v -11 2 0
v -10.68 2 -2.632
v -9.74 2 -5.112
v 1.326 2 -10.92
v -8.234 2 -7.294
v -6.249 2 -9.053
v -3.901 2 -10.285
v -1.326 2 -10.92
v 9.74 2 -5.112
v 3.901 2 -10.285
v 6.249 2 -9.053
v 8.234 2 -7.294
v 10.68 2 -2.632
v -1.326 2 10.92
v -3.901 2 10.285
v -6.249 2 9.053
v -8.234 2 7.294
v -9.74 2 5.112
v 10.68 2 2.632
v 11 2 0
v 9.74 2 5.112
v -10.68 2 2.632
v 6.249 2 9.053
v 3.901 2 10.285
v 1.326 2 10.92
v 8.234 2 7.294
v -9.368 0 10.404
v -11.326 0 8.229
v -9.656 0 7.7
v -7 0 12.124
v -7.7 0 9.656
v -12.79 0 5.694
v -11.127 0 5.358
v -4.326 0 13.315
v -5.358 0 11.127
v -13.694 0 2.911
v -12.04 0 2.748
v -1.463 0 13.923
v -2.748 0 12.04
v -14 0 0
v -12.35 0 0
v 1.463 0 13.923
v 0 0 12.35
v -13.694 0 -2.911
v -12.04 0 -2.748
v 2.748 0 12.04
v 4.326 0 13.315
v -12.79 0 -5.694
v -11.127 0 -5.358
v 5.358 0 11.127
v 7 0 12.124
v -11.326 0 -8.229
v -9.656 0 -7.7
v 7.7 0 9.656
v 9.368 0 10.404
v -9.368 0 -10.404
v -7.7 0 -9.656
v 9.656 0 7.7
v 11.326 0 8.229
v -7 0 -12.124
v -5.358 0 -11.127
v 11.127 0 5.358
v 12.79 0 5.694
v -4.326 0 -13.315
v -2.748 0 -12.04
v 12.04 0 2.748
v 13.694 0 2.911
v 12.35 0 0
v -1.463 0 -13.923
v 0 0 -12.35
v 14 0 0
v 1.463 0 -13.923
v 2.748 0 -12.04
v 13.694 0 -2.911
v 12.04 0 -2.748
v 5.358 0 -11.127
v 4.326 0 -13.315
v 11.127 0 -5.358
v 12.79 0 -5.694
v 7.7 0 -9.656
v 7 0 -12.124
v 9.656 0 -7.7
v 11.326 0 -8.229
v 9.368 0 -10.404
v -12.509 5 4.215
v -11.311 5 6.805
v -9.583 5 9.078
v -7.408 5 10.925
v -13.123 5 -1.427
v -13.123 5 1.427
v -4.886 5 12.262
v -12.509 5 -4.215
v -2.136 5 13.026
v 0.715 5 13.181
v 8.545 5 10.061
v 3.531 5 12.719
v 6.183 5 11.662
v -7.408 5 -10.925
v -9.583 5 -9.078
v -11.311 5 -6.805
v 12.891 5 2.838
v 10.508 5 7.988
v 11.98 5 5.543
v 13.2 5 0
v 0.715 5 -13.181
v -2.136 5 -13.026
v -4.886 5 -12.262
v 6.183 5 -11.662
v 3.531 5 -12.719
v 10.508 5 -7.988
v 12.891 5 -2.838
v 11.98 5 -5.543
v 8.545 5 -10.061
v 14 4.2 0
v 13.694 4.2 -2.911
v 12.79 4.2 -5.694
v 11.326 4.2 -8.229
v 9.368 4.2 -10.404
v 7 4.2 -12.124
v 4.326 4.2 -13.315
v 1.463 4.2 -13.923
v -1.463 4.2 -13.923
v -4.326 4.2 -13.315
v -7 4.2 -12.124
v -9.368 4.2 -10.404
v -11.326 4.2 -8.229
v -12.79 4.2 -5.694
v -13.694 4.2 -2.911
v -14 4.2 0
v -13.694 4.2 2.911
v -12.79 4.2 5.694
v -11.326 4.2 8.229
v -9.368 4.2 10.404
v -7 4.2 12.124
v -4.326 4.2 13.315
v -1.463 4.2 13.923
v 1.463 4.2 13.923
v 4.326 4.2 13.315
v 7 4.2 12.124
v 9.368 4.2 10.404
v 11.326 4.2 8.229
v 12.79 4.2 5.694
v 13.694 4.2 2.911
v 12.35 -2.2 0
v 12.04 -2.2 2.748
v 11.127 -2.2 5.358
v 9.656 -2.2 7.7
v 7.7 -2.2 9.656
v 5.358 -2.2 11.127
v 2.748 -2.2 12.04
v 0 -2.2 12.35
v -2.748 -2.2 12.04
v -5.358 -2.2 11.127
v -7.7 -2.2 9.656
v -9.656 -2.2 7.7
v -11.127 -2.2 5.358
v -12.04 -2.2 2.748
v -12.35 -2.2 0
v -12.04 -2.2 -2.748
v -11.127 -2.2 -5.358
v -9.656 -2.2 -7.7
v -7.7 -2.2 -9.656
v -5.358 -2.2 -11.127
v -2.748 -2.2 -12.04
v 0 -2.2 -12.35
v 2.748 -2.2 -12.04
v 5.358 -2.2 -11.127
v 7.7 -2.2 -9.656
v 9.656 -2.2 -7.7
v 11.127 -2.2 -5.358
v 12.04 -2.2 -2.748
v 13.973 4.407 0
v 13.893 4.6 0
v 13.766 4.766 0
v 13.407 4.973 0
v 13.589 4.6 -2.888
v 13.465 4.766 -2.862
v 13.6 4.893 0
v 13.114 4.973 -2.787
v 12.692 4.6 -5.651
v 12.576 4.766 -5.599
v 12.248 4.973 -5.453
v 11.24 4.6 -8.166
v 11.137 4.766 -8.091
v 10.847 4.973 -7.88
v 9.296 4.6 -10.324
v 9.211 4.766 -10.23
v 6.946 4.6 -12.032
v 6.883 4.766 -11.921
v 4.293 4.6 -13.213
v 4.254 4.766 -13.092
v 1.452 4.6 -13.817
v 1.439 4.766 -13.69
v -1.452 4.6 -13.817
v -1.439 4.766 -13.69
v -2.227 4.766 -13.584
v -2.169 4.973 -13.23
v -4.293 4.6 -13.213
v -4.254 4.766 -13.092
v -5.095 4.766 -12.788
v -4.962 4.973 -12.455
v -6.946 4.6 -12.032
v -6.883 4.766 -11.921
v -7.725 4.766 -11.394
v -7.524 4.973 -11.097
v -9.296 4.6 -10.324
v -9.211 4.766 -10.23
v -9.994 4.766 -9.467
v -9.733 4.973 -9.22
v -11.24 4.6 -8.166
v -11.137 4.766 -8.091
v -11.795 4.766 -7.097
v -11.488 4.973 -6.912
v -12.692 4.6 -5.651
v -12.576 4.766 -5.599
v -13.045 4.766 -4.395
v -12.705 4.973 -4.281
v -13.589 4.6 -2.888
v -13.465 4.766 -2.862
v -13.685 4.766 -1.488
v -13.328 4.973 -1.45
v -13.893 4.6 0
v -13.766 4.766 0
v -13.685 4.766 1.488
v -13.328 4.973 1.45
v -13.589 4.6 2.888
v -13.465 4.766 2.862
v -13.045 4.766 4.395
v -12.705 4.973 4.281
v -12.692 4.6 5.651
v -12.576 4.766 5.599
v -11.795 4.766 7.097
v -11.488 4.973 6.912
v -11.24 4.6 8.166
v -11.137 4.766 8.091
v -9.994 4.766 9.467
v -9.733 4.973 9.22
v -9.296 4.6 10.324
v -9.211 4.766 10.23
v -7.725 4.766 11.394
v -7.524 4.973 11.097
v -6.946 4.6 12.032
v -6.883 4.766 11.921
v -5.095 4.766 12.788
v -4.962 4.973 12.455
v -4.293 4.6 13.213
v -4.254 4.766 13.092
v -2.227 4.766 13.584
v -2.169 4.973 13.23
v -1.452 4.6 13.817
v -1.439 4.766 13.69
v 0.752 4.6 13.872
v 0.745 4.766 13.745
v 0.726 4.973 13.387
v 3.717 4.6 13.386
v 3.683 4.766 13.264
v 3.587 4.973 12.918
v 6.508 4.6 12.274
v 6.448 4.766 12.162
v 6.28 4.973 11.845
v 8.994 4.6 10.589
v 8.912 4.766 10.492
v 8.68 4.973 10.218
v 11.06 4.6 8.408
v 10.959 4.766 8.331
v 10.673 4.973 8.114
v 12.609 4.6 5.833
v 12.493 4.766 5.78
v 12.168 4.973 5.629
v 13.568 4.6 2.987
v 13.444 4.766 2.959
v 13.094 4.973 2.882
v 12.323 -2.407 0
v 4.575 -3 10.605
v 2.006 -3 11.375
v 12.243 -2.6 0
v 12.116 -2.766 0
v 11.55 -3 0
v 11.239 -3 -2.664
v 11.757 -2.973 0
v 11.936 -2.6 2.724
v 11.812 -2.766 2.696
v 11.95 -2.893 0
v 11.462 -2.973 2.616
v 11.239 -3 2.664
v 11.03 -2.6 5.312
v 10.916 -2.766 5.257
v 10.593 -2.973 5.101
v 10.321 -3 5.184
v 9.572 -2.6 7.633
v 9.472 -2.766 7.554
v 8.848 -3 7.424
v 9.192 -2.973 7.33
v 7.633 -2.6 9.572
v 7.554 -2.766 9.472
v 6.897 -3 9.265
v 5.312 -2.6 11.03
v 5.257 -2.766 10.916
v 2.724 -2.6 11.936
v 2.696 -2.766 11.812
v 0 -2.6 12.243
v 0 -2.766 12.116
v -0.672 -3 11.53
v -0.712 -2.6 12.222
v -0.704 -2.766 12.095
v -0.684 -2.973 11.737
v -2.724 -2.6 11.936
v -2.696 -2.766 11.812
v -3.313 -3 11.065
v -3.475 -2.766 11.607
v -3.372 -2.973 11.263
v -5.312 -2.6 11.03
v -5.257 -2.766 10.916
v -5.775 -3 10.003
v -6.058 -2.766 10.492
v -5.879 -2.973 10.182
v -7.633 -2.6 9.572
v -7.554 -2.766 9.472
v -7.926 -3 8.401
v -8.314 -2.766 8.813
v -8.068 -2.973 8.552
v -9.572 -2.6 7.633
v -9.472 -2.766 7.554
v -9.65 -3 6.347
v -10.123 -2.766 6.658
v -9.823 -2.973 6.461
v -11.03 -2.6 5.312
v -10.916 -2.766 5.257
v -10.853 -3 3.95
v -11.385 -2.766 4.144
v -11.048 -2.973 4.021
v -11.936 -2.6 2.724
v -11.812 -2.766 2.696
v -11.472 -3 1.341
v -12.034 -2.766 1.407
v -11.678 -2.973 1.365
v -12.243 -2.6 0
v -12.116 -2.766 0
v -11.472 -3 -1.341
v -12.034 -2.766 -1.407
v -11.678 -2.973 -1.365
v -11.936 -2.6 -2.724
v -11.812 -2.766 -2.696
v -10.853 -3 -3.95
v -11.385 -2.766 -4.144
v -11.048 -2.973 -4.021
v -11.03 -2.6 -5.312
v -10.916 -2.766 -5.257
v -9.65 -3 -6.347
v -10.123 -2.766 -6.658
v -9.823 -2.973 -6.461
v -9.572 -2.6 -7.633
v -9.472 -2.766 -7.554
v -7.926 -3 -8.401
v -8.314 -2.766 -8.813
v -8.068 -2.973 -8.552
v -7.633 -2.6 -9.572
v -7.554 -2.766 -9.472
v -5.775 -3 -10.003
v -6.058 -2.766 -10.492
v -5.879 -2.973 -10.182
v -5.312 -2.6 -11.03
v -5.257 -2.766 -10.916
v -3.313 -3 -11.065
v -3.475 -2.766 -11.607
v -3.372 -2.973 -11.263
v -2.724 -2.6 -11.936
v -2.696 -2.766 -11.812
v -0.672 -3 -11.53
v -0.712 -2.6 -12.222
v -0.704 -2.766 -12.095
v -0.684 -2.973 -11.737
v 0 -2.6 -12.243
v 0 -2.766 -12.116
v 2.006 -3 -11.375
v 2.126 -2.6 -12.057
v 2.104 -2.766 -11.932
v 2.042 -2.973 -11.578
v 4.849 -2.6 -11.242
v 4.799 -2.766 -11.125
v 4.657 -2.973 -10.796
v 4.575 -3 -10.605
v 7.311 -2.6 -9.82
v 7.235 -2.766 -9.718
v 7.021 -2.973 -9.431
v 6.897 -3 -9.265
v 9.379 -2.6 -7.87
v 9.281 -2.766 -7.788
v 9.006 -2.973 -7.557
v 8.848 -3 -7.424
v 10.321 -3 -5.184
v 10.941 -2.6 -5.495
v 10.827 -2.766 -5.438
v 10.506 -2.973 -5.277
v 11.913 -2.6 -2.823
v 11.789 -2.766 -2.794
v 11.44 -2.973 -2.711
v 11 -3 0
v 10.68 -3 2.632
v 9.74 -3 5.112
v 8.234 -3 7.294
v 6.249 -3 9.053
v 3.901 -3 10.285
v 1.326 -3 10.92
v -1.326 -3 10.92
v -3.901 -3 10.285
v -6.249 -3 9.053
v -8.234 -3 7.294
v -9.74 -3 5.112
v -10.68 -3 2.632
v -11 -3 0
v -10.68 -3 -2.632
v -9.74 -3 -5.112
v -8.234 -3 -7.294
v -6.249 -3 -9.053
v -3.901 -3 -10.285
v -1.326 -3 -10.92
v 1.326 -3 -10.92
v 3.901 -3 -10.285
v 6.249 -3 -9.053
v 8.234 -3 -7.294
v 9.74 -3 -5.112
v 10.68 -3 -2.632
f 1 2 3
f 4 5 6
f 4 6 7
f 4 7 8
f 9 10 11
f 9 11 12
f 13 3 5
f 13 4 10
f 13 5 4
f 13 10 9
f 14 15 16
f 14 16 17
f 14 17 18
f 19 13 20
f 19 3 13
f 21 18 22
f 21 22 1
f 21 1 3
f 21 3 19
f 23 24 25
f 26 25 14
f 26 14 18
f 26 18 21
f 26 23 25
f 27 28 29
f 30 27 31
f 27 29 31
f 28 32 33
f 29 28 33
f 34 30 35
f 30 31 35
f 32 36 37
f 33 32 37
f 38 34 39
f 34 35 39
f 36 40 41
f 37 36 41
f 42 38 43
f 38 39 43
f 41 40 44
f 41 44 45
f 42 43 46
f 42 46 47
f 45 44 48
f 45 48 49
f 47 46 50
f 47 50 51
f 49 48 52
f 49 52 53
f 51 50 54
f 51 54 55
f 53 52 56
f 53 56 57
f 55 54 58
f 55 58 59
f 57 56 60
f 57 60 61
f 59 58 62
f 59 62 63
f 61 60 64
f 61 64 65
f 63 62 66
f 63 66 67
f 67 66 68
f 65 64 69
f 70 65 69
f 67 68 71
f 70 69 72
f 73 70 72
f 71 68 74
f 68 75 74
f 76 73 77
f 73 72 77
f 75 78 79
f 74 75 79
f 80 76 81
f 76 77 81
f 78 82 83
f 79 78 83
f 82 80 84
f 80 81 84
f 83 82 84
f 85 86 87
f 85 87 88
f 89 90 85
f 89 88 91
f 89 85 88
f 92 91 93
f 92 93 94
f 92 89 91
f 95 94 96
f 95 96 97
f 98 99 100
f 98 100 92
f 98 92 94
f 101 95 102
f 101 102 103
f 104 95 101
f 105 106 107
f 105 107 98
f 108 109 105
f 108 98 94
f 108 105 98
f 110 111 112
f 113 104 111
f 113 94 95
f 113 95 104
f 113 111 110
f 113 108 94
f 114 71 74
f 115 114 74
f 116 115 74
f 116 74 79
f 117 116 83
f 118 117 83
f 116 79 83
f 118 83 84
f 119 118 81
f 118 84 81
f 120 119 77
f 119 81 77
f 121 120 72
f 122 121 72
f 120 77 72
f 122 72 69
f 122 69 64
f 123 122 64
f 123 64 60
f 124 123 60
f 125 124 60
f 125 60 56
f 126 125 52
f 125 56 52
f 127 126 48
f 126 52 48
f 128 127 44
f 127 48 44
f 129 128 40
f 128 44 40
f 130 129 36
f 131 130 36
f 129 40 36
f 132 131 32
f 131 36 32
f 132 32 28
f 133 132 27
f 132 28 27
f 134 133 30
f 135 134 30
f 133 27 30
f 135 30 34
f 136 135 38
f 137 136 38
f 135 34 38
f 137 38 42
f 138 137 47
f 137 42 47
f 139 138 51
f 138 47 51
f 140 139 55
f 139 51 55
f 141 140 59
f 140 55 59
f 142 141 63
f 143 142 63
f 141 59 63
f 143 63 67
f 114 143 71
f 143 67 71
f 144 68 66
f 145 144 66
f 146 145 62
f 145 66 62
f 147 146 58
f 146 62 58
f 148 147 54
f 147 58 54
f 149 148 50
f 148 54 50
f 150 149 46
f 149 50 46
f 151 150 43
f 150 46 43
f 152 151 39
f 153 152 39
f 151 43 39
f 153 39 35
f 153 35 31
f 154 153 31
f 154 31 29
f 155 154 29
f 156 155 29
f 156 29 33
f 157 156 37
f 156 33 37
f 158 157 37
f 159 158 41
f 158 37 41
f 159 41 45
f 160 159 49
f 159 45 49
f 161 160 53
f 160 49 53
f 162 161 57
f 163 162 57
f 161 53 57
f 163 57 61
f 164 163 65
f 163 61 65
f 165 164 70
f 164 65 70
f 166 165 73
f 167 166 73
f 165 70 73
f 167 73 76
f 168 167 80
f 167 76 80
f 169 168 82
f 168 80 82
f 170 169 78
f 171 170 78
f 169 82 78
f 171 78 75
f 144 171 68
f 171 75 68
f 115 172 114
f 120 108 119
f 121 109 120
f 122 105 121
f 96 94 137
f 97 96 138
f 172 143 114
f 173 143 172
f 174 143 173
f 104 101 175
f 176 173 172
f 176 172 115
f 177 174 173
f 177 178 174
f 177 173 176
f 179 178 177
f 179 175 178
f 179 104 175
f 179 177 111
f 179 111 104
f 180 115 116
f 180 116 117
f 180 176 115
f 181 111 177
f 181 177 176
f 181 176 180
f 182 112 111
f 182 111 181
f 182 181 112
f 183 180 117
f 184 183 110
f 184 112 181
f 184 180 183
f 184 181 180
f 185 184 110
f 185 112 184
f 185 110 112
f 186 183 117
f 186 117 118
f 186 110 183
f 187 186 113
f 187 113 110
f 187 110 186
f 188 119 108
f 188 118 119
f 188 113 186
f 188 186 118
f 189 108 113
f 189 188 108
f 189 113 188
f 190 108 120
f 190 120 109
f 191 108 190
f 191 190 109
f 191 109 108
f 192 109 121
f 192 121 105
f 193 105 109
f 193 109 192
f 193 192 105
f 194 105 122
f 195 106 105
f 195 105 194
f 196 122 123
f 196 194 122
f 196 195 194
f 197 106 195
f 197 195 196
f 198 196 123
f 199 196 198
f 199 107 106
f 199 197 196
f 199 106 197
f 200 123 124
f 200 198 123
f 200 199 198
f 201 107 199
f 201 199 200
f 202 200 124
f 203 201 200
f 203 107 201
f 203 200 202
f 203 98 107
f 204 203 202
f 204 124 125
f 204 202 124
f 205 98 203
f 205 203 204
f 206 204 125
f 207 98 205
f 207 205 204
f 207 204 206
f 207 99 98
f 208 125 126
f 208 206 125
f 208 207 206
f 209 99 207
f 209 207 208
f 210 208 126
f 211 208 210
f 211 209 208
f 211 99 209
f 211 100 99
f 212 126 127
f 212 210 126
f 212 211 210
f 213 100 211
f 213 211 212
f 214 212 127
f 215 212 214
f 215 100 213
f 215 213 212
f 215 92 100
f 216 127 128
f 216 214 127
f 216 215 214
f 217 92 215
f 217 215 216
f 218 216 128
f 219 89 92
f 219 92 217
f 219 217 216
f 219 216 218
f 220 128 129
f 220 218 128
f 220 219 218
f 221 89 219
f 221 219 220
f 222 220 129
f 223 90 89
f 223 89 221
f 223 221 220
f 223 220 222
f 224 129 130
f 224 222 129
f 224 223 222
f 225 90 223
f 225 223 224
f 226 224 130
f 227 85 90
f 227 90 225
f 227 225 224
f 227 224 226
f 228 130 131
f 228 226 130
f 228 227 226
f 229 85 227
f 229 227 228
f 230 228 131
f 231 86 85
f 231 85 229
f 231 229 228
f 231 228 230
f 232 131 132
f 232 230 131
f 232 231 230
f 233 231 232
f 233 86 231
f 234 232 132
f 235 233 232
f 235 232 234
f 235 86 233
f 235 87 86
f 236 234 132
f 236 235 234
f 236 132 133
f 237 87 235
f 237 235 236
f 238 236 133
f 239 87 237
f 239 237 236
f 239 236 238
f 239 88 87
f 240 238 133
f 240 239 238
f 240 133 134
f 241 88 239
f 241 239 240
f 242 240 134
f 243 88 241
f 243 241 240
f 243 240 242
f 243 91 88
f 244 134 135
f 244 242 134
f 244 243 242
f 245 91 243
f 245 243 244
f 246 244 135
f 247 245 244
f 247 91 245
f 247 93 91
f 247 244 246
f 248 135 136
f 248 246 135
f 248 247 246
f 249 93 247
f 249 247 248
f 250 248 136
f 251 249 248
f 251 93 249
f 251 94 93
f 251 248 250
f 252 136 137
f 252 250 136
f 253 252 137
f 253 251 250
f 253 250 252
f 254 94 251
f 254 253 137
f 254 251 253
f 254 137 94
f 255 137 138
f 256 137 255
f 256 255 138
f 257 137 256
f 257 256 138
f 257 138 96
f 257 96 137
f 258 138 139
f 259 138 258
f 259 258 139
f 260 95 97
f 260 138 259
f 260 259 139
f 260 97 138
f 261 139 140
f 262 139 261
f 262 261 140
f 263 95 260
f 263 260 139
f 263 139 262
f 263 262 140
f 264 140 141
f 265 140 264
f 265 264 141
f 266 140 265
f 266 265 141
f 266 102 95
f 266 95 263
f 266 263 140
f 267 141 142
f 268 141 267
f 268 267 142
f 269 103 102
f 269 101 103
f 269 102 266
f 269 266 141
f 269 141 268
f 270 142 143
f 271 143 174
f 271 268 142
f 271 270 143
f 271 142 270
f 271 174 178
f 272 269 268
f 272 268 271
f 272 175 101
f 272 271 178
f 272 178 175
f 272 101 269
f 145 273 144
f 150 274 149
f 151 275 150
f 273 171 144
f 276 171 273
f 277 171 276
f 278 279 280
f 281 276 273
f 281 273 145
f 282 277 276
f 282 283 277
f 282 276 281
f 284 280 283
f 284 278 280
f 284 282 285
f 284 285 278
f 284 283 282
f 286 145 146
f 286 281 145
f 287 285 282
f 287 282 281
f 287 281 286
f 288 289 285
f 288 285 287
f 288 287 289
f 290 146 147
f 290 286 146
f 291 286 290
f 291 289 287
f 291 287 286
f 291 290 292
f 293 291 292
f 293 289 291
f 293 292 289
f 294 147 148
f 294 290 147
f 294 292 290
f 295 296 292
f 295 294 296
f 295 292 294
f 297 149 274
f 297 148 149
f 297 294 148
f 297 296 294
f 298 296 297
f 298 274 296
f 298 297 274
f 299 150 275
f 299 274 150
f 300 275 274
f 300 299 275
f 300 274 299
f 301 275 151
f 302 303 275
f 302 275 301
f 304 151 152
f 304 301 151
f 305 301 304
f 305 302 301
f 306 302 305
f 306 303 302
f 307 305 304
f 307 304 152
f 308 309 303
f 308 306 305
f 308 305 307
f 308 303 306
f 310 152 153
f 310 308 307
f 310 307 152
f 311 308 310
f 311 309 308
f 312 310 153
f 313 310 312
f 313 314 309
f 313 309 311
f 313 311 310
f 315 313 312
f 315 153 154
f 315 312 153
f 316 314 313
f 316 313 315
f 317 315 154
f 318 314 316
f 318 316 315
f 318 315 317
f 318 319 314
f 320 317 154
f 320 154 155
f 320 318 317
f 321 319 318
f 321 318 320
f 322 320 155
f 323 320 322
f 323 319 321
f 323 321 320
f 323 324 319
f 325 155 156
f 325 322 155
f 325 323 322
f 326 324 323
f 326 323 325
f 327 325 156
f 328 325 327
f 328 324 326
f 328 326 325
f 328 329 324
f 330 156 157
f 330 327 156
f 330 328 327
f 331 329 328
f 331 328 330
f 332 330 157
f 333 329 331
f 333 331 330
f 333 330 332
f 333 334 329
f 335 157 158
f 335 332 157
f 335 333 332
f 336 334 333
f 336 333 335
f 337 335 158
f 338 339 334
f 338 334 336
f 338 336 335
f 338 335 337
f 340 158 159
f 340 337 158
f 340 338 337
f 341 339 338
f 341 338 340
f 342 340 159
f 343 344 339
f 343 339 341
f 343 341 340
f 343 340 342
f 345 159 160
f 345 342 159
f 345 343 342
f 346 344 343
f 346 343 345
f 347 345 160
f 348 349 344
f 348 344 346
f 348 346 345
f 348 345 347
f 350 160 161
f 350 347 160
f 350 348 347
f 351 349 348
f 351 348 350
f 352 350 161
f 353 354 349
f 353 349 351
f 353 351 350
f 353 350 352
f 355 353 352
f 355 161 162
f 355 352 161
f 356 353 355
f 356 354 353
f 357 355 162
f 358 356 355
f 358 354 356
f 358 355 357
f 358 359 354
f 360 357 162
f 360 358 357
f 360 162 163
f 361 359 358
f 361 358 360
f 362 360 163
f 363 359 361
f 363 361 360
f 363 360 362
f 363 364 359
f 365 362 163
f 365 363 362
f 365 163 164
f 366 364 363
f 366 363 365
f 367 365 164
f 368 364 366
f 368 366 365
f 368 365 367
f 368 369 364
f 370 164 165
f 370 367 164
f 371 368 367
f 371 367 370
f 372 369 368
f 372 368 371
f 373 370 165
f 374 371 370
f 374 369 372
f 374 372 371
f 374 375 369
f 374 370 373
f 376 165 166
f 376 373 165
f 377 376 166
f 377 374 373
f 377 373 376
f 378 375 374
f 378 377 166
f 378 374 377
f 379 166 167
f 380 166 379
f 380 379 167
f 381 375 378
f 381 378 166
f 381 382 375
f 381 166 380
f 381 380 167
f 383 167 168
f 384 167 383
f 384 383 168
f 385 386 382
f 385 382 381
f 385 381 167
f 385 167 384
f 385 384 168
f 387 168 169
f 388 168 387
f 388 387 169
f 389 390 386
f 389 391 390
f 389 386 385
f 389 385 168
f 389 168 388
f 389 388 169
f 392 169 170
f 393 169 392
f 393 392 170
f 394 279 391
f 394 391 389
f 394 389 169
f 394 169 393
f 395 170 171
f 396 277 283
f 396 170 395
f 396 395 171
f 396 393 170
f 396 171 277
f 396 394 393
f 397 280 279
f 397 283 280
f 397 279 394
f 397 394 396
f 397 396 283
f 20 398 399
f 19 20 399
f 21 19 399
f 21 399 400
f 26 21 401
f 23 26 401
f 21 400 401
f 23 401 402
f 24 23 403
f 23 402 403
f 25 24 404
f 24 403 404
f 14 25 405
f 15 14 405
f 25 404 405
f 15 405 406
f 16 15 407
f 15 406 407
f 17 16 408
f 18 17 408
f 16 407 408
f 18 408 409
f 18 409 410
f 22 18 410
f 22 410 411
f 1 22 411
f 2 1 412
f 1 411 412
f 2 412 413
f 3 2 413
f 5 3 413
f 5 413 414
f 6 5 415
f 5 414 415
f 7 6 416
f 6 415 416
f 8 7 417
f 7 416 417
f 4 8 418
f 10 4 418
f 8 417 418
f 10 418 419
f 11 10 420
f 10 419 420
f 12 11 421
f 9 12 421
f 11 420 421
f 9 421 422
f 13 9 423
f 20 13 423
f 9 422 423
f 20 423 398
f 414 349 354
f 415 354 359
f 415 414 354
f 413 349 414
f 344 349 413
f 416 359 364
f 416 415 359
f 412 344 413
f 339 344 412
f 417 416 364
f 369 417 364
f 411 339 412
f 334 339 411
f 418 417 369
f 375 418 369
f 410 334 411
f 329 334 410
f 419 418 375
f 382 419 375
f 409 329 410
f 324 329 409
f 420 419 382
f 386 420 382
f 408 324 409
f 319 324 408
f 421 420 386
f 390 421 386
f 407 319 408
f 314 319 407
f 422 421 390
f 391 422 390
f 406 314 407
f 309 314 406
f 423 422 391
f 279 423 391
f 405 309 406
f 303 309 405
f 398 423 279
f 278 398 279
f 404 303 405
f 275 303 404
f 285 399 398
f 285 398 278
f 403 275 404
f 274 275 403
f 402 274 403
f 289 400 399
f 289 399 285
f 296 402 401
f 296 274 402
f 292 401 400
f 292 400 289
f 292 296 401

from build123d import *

# Parameters (mm, degrees)
SKETCH_1_R          = 14
EXTRUDE_1_DEPTH     = 5
SKETCH_2_R          = 12.35
EXTRUDE_2_DEPTH     = 3
SKETCH_3_R          = 11
CUT_EXTRUDE_1_DEPTH = 5
FILLET_2_R          = 0.8
FILLET_3_R          = 0.8


with BuildPart() as part:
    # Эскиз1 → Бобышка-Вытянуть1 (new body)
    with BuildSketch(Plane(origin=(0, 0, 0), x_dir=(1, 0, 0), z_dir=(0, 1, 0))):
        Circle(SKETCH_1_R)
    extrude(amount=EXTRUDE_1_DEPTH)

    # Эскиз2 → Бобышка-Вытянуть2 (add)
    with BuildSketch(Plane.XZ):
        Circle(SKETCH_2_R)
    extrude(amount=EXTRUDE_2_DEPTH)

    # Эскиз3 → Вырез-Вытянуть1 (cut)
    with BuildSketch(Plane.XZ.offset(3)):
        Circle(SKETCH_3_R)
    extrude(amount=-CUT_EXTRUDE_1_DEPTH, mode=Mode.SUBTRACT)

    # Скругление2
    fillet_2_edges = [part.edges().sort_by_distance(p)[0] for p in [
        (-12.35, -3, 0),
    ]]
    fillet(fillet_2_edges, radius=FILLET_2_R)

    # Скругление3
    fillet_3_edges = [part.edges().sort_by_distance(p)[0] for p in [
        (-14, 5, 0),
    ]]
    fillet(fillet_3_edges, radius=FILLET_3_R)


solid = part.part
